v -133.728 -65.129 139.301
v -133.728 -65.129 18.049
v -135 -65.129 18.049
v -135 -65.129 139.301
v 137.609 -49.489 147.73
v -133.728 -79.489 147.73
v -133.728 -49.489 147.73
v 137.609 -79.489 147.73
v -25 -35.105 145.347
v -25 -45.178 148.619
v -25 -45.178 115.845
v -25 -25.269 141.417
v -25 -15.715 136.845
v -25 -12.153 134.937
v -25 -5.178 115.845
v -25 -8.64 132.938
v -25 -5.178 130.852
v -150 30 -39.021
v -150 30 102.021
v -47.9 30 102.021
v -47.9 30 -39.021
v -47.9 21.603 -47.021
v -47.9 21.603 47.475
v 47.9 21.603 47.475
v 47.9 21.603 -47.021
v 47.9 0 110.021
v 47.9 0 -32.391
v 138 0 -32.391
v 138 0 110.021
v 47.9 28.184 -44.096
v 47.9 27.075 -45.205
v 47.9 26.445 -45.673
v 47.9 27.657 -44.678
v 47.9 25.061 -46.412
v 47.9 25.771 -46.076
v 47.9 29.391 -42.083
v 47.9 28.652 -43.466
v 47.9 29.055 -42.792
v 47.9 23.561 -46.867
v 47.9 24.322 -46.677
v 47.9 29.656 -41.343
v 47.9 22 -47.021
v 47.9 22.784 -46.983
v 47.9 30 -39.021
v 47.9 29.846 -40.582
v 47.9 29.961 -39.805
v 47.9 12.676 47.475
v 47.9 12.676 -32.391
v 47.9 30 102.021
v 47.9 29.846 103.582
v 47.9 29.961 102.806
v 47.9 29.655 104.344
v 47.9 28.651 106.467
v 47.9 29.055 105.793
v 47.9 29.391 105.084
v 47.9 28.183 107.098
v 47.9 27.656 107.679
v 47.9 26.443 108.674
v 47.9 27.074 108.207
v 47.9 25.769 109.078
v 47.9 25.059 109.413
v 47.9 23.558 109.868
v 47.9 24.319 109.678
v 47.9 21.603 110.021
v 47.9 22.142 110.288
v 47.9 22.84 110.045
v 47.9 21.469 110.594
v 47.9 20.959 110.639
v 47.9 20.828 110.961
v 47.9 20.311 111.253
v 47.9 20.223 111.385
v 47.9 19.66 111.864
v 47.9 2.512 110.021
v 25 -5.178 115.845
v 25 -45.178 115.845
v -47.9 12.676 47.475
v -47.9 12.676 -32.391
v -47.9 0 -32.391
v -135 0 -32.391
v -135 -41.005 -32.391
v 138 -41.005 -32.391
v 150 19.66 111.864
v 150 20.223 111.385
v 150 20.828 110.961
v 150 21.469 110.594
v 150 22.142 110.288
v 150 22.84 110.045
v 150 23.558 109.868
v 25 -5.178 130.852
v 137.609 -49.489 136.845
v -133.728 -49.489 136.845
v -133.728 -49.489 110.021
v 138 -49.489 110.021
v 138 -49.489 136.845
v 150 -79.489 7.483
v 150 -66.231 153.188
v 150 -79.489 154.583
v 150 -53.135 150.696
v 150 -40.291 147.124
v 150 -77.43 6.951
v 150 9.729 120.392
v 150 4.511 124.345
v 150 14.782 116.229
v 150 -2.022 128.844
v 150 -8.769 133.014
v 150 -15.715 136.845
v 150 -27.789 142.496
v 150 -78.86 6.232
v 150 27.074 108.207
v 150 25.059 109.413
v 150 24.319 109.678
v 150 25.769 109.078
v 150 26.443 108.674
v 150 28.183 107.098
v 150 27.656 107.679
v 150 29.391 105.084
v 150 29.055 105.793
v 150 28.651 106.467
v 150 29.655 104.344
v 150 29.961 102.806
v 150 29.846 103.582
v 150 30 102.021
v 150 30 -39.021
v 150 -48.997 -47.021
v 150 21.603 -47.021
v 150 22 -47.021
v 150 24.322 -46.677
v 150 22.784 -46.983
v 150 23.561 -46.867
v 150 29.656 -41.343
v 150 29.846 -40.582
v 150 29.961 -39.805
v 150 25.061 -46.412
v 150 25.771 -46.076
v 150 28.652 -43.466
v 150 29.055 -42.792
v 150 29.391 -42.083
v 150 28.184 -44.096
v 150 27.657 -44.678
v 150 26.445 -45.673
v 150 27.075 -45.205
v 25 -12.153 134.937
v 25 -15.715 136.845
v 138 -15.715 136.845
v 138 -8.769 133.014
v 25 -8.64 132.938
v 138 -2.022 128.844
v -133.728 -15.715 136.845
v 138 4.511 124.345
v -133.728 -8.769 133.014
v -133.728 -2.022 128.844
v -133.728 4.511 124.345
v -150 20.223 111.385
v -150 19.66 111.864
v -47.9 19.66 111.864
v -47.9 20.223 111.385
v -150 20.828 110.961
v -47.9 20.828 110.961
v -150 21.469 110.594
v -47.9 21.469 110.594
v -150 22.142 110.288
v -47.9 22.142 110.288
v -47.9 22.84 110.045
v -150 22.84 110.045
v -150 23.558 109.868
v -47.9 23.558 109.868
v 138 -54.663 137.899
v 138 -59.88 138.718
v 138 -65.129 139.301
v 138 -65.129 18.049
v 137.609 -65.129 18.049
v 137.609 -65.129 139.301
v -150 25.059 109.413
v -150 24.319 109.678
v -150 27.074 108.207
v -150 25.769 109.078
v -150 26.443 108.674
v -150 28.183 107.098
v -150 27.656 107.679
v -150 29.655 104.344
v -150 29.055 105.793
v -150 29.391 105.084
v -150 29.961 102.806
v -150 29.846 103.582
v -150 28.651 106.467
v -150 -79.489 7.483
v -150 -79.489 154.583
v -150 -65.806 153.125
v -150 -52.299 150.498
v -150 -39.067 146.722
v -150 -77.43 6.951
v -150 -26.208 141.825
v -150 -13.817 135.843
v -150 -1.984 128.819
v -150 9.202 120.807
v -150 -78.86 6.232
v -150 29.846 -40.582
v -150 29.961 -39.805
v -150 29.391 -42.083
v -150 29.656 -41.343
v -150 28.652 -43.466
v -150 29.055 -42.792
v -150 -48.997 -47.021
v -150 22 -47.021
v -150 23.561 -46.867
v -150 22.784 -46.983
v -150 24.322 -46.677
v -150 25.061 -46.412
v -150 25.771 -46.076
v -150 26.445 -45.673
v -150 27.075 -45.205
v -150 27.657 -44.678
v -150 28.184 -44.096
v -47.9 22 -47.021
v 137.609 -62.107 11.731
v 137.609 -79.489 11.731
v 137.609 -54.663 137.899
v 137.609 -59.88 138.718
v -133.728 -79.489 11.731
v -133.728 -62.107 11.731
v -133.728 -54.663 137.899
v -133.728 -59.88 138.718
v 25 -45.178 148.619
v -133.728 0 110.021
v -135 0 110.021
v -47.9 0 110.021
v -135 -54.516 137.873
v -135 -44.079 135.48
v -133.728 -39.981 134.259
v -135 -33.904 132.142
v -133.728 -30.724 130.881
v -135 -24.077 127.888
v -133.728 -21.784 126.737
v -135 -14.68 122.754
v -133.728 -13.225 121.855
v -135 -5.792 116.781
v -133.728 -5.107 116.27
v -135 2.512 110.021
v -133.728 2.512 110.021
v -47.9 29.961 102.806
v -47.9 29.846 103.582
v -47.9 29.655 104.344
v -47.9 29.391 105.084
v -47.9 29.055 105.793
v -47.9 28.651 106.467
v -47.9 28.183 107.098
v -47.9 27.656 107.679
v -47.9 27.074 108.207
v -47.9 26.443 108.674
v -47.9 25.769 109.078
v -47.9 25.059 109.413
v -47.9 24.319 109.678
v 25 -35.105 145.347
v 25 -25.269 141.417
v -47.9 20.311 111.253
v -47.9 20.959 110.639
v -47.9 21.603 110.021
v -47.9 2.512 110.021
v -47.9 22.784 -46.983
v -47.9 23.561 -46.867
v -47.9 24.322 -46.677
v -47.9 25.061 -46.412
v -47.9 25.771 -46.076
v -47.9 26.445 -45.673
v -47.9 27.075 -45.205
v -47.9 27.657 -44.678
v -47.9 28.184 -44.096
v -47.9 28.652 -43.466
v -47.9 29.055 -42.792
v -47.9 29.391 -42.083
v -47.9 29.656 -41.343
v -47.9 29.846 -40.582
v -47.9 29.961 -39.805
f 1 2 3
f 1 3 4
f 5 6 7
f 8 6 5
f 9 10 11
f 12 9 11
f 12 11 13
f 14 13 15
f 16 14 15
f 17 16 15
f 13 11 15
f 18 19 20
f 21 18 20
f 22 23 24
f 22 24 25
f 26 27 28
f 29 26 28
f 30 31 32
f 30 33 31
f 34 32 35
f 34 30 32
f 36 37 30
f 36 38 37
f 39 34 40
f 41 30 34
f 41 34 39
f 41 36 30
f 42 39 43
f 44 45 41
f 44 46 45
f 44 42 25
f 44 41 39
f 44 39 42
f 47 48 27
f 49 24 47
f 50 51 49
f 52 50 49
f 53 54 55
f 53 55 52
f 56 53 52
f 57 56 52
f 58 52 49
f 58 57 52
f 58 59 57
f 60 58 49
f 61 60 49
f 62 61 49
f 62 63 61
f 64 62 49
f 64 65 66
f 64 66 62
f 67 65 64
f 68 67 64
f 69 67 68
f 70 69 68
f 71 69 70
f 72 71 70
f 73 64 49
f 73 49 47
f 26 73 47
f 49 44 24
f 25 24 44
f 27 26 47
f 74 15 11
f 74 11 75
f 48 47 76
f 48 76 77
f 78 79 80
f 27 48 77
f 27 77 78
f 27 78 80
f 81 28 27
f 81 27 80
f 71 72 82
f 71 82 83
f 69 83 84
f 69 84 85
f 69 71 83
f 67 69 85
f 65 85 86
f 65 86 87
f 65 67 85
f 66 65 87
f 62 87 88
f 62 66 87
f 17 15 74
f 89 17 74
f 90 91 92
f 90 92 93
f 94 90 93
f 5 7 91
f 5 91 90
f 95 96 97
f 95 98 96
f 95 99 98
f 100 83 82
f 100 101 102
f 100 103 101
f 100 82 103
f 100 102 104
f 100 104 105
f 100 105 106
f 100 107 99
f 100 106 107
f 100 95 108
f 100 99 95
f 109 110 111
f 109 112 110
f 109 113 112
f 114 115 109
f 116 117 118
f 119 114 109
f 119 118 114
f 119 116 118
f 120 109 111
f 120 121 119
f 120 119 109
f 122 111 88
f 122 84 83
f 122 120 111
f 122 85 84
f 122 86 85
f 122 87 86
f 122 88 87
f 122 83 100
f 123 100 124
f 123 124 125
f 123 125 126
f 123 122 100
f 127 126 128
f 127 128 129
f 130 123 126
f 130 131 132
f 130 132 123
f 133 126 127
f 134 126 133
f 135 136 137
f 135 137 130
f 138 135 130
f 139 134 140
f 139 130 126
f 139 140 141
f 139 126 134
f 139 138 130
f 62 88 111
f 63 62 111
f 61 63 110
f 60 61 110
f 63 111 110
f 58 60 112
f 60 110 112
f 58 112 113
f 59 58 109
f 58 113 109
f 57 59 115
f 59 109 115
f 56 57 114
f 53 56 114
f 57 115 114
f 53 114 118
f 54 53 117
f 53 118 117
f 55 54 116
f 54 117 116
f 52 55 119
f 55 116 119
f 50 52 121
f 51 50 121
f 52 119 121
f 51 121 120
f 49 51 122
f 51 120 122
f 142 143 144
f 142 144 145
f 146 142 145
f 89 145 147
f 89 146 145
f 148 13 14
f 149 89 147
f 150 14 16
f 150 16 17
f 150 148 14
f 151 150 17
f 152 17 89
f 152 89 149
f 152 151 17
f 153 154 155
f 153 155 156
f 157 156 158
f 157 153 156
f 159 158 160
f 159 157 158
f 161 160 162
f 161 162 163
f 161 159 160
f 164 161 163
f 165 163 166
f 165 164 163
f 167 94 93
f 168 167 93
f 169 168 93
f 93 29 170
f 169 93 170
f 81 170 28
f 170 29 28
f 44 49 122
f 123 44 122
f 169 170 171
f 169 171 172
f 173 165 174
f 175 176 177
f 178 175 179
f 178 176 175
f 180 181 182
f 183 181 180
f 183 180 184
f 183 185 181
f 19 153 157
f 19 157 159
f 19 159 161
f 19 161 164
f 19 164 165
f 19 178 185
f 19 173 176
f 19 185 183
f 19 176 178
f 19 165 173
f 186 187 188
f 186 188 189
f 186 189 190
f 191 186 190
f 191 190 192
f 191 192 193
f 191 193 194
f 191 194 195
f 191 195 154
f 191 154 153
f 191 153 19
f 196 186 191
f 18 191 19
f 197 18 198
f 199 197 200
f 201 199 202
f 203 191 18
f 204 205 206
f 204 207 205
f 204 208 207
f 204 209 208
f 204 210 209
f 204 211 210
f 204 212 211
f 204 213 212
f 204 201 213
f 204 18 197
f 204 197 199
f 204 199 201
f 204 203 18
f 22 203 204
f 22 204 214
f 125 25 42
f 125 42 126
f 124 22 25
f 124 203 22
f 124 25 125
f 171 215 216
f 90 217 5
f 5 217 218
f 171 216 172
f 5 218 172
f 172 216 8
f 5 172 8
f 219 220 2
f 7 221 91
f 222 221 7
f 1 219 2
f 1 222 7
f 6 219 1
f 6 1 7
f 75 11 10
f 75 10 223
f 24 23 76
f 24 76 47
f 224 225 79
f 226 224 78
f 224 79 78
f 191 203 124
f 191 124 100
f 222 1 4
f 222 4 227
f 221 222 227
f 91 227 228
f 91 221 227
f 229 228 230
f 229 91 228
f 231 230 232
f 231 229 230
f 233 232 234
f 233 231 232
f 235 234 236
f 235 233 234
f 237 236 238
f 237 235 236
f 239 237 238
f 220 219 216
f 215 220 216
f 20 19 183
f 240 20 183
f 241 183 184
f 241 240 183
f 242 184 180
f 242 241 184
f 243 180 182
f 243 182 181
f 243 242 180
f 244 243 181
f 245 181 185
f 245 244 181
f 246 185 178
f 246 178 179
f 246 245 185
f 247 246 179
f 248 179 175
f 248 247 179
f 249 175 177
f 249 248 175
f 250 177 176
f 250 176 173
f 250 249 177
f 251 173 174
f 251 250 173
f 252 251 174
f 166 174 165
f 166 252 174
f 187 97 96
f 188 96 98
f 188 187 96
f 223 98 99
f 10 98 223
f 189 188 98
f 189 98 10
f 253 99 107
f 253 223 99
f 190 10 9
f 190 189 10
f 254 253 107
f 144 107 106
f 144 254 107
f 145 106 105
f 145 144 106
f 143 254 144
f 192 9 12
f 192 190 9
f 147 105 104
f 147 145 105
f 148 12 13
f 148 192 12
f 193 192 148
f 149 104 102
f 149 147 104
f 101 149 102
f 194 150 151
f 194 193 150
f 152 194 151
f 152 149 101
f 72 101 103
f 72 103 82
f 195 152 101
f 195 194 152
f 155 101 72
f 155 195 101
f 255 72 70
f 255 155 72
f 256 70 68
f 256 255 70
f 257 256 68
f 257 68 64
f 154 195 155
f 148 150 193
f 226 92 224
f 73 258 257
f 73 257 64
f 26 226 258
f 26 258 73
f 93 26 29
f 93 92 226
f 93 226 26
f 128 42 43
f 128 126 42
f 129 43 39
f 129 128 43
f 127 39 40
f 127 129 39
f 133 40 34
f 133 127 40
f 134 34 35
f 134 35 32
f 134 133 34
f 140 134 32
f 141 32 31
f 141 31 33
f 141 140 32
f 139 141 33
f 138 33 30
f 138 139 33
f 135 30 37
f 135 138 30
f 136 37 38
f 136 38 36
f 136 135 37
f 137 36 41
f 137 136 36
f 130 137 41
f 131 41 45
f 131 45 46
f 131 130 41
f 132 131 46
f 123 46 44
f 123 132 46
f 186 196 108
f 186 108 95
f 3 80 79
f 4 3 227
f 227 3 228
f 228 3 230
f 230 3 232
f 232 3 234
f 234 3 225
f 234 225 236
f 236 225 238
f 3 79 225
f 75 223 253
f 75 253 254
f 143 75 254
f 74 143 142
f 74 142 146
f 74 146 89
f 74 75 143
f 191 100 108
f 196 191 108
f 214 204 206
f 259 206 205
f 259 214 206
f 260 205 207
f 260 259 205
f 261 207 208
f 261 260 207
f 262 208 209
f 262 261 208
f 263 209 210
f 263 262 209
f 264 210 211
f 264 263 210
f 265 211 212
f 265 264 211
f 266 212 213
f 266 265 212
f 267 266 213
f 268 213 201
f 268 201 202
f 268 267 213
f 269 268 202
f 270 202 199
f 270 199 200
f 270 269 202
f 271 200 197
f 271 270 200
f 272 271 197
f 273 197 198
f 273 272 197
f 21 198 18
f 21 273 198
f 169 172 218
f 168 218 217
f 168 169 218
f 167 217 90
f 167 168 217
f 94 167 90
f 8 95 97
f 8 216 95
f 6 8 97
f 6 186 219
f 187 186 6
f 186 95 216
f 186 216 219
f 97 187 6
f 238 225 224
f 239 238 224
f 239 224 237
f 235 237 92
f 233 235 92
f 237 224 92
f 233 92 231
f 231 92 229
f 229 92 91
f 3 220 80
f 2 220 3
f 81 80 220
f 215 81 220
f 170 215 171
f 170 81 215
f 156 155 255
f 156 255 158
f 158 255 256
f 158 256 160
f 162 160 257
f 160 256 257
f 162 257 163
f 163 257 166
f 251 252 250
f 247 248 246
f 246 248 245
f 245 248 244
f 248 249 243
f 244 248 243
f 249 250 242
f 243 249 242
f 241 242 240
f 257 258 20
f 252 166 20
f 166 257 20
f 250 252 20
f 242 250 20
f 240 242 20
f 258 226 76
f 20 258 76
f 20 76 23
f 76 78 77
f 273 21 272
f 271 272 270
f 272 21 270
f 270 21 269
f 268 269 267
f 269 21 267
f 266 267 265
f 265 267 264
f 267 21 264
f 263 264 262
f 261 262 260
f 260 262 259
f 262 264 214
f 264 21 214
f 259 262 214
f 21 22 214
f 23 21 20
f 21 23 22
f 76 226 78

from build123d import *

# Parameters (mm, degrees)
BOSS_EXTRUDE1_DEPTH      = 150
BOSS_EXTRUDE1_DEPTH_BACK = 150
CUT_EXTRUDE3_DEPTH       = 375.5
CUT_EXTRUDE6_DEPTH       = 329
SKETCH9_W                = 271.336979698
SKETCH9_H                = 135.998838498
CUT_EXTRUDE9_DEPTH       = 30
SKETCH10_W               = 95.8
SKETCH10_H               = 62.546807737
CUT_EXTRUDE11_DEPTH      = 30
SKETCH11_W               = 102.1
SKETCH11_H               = 157.042427203
BOSS_EXTRUDE2_DEPTH      = 30
FILLET4_R                = 8
FILLET5_R                = 8
FILLET6_R                = 8
FILLET7_R                = 8
FILLET8_R                = 8
FILLET9_R                = 8
BOSS_EXTRUDE3_DEPTH      = 12
BOSS_EXTRUDE4_START      = -15
BOSS_EXTRUDE4_DEPTH      = 15
SKETCH17_W               = 271.728058528
SKETCH17_H               = 26.824087215
BOSS_EXTRUDE5_DEPTH      = 54
CUT_EXTRUDE14_DEPTH      = 21
CUT_EXTRUDE14_DEPTH_BACK = 21
SKETCH18_W               = 50
SKETCH18_H               = 40
CUT_EXTRUDE15_START      = -349
CUT_EXTRUDE15_DEPTH      = 349


with BuildPart() as part:
    # Sketch2 → Boss-Extrude1 (new, two sides: drawn at the far end of the back side and taken through both)
    with BuildSketch(Plane(origin=(0, 0, 0), x_dir=(0, 0, -1), z_dir=(1, 0, 0)).offset(-BOSS_EXTRUDE1_DEPTH_BACK)):
        with BuildLine():
            Line((47.021092325, 21.603077895), (47.021092325, -52.096922105))
            Line((47.021092325, -52.096922105), (-7.482950192, -79.488697318))
            Line((-7.482950192, -79.488697318), (-154.582950192, -79.488697318))
            ThreePointArc((-154.582950192, -79.488697318), (-141.2900932, -24.98088898), (-110.021334878, 21.603077895))
            Line((-110.021334878, 21.603077895), (47.021092325, 21.603077895))
        make_face()
    extrude(amount=BOSS_EXTRUDE1_DEPTH + BOSS_EXTRUDE1_DEPTH_BACK)

    # Sketch6 → Cut-Extrude3 (cut)
    with BuildSketch(Plane(origin=(150, 0, 0), x_dir=(0, 0, -1), z_dir=(1, 0, 0))):
        Polygon((47.021092325, -52.096922105), (47.021092325, -48.996922105), (-6.950510533, -77.430419395), (-6.23203774, -78.860033625), align=None)
    extrude(amount=-CUT_EXTRUDE3_DEPTH, mode=Mode.SUBTRACT)

    # Sketch8 → Cut-Extrude6 (cut)
    with BuildSketch(Plane(origin=(150, 0, 0), x_dir=(0, 0, -1), z_dir=(1, 0, 0))):
        with BuildLine():
            Line((-18.049462918, -65.128698573), (-139.30133294, -65.128698573))
            ThreePointArc((-139.30133294, -65.128698573), (-127.051990379, -22.399103161), (-99.746787758, 12.676395797))
            Line((-99.746787758, 12.676395797), (32.391473071, 12.676395797))
            Line((32.391473071, 12.676395797), (32.391473071, -41.004772665))
            Line((32.391473071, -41.004772665), (-18.049462918, -65.128698573))
        make_face()
    extrude(amount=-CUT_EXTRUDE6_DEPTH, mode=Mode.SUBTRACT)

    # Sketch9 → Cut-Extrude9 (cut)
    with BuildSketch(Plane.XZ.offset(79.488697318)):
        with Locations((1.940431321, 79.730726135)):
            Rectangle(SKETCH9_W, SKETCH9_H)
    extrude(amount=-CUT_EXTRUDE9_DEPTH, mode=Mode.SUBTRACT)

    # Sketch10 → Cut-Extrude11 (cut)
    with BuildSketch(Plane(origin=(0, 21.603077895, 0), x_dir=(1, 0, 0), z_dir=(0, 1, 0))):
        with Locations((0, -78.74793101)):
            Rectangle(SKETCH10_W, SKETCH10_H)
    extrude(amount=-CUT_EXTRUDE11_DEPTH, mode=Mode.SUBTRACT)

    # Sketch11 → Boss-Extrude2 (add)
    with BuildSketch(Plane(origin=(0, 0, 0), x_dir=(1, 0, 0), z_dir=(0, 1, 0))):
        with Locations((-98.95, -31.500121276)):
            Rectangle(SKETCH11_W, SKETCH11_H)
        with Locations((98.95, -31.500121276)):
            Rectangle(SKETCH11_W, SKETCH11_H)
    extrude(amount=BOSS_EXTRUDE2_DEPTH)

    # Fillet4
    fillet4_edges = [part.edges().sort_by_distance(p)[0] for p in [
        (-98.95, 30, 110.021334878),
    ]]
    fillet(fillet4_edges, radius=FILLET4_R)

    # Fillet5
    fillet5_edges = [part.edges().sort_by_distance(p)[0] for p in [
        (98.95, 30, 110.021334878),
    ]]
    fillet(fillet5_edges, radius=FILLET5_R)

    # Fillet6
    # the kernel refuses this fillet: 8 mm, written as the material it adds along each edge
    with BuildSketch(Plane(origin=(-150, 21.603077895, 110.021334878), x_dir=(0, -0.7256761067447404, 0.6880364729429655), z_dir=(1, 0, 0))) as fillet6_piece_1:
        with BuildLine():
            CenterArc((2.744889422, -7.999720666), FILLET6_R, 90.478801773, 31.768597775)
            Line((-1.523719625, -1.233704348), (-1.950580529, -0.557102717))
            ThreePointArc((-1.950580529, -0.557102717), (-0.838466066, 0.307444001), (-0.550429178, 0.580540885))
            Line((-0.550429178, 0.580540885), (0.006685256, 0.799972067))
            ThreePointArc((0.006685256, 0.799972067), (1.33901843, 0.794405102), (2.671351604, 0.799972067))
            Line((2.671351604, 0.799972067), (2.67803686, 0))
        make_face()
    extrude(amount=102.1)
    # the kernel refuses this fillet: 8 mm, written as the material it takes off along each edge

    # Fillet7
    # the kernel refuses this fillet: 8 mm, written as the material it adds along each edge
    with BuildSketch(Plane(origin=(47.9, 21.603077895, 110.021334878), x_dir=(0, 0.9969460846976341, -0.07809292033249748), z_dir=(1, 0, 0))) as fillet7_piece_1:
        with BuildLine():
            CenterArc((2.900642421, 7.944571871), FILLET7_R, 231.482877932, 31.768597775)
            Line((-2.081345425, 1.685195137), (-2.579544209, 1.059257463))
            ThreePointArc((-2.579544209, 1.059257463), (-1.540564119, 0.225193287), (-0.508590223, -0.617524077))
            Line((-0.508590223, -0.617524077), (0.062474336, -0.797556868))
            ThreePointArc((0.062474336, -0.797556868), (0.458184274, -0.766560061), (1.866538405, -0.794457187))
            Line((1.866538405, -0.794457187), (1.960547861, 0))
        make_face()
    extrude(amount=102.1)
    # the kernel refuses this fillet: 8 mm, written as the material it takes off along each edge

    # Fillet8
    fillet8_edges = [part.edges().sort_by_distance(p)[0] for p in [
        (98.95, 30, -47.021092325),
    ]]
    fillet(fillet8_edges, radius=FILLET8_R)

    # Fillet9
    fillet9_edges = [part.edges().sort_by_distance(p)[0] for p in [
        (-98.95, 30, -47.021092325),
    ]]
    fillet(fillet9_edges, radius=FILLET9_R)

    # Sketch13 → Boss-Extrude3 (add)
    with BuildSketch(Plane(origin=(150, 0, 0), x_dir=(0, 0, -1), z_dir=(1, 0, 0))):
        with BuildLine():
            Line((-139.30133294, -65.128698573), (-18.049462918, -65.128698573))
            Line((-18.049462918, -65.128698573), (32.391473071, -41.004772665))
            Line((32.391473071, -41.004772665), (32.391473071, 0))
            Line((32.391473071, 0), (-110.021334878, 0))
            Line((-110.021334878, 0), (-110.021334878, 2.512453321))
            ThreePointArc((-110.021334878, 2.512453321), (-130.12762054, -28.941917181), (-139.30133294, -65.128698573))
        make_face()
    extrude(amount=-BOSS_EXTRUDE3_DEPTH)

    # Sketch15 → Boss-Extrude4 (add)
    with BuildSketch(Plane.ZY.offset(150).offset(BOSS_EXTRUDE4_START)):
        with BuildLine():
            Line((-32.391473071, 0), (-32.391473071, -41.004772665))
            Line((-32.391473071, -41.004772665), (18.049462918, -65.128698573))
            Line((18.049462918, -65.128698573), (139.30133294, -65.128698573))
            ThreePointArc((139.30133294, -65.128698573), (130.12762054, -28.941917181), (110.021334878, 2.512453321))
            Line((110.021334878, 2.512453321), (110.021334878, 0))
            Line((110.021334878, 0), (-32.391473071, 0))
        make_face()
    extrude(amount=BOSS_EXTRUDE4_DEPTH)

    # Sketch17 → Boss-Extrude5 (add)
    with BuildSketch(Plane.XZ.offset(49.488697318)):
        with Locations((2.135970736, 123.433378486)):
            Rectangle(SKETCH17_W, SKETCH17_H)
    extrude(amount=-BOSS_EXTRUDE5_DEPTH)

    # Sketch18 → Cut-Extrude14 (cut, two sides: drawn at the far end of the back side and taken through both)
    with BuildSketch(Plane.XY.offset(136.845422093).offset(-CUT_EXTRUDE14_DEPTH_BACK)):
        with Locations((0, -25.17833284)):
            Rectangle(SKETCH18_W, SKETCH18_H)
    extrude(amount=CUT_EXTRUDE14_DEPTH + CUT_EXTRUDE14_DEPTH_BACK, mode=Mode.SUBTRACT)

    # Sketch20 → Cut-Extrude15 (cut)
    with BuildSketch(Plane(origin=(150, 0, 0), x_dir=(0, 0, -1), z_dir=(1, 0, 0)).offset(CUT_EXTRUDE15_START)):
        with BuildLine():
            Line((-136.845422093, 4.511302682), (-124.344519516, 4.511302682))
            ThreePointArc((-124.344519516, 4.511302682), (-130.970660544, -5.3695664), (-136.845422093, -15.714830799))
            Line((-136.845422093, -15.714830799), (-136.845422093, 4.511302682))
        make_face()
    extrude(amount=CUT_EXTRUDE15_DEPTH, mode=Mode.SUBTRACT)


solid = part.part
